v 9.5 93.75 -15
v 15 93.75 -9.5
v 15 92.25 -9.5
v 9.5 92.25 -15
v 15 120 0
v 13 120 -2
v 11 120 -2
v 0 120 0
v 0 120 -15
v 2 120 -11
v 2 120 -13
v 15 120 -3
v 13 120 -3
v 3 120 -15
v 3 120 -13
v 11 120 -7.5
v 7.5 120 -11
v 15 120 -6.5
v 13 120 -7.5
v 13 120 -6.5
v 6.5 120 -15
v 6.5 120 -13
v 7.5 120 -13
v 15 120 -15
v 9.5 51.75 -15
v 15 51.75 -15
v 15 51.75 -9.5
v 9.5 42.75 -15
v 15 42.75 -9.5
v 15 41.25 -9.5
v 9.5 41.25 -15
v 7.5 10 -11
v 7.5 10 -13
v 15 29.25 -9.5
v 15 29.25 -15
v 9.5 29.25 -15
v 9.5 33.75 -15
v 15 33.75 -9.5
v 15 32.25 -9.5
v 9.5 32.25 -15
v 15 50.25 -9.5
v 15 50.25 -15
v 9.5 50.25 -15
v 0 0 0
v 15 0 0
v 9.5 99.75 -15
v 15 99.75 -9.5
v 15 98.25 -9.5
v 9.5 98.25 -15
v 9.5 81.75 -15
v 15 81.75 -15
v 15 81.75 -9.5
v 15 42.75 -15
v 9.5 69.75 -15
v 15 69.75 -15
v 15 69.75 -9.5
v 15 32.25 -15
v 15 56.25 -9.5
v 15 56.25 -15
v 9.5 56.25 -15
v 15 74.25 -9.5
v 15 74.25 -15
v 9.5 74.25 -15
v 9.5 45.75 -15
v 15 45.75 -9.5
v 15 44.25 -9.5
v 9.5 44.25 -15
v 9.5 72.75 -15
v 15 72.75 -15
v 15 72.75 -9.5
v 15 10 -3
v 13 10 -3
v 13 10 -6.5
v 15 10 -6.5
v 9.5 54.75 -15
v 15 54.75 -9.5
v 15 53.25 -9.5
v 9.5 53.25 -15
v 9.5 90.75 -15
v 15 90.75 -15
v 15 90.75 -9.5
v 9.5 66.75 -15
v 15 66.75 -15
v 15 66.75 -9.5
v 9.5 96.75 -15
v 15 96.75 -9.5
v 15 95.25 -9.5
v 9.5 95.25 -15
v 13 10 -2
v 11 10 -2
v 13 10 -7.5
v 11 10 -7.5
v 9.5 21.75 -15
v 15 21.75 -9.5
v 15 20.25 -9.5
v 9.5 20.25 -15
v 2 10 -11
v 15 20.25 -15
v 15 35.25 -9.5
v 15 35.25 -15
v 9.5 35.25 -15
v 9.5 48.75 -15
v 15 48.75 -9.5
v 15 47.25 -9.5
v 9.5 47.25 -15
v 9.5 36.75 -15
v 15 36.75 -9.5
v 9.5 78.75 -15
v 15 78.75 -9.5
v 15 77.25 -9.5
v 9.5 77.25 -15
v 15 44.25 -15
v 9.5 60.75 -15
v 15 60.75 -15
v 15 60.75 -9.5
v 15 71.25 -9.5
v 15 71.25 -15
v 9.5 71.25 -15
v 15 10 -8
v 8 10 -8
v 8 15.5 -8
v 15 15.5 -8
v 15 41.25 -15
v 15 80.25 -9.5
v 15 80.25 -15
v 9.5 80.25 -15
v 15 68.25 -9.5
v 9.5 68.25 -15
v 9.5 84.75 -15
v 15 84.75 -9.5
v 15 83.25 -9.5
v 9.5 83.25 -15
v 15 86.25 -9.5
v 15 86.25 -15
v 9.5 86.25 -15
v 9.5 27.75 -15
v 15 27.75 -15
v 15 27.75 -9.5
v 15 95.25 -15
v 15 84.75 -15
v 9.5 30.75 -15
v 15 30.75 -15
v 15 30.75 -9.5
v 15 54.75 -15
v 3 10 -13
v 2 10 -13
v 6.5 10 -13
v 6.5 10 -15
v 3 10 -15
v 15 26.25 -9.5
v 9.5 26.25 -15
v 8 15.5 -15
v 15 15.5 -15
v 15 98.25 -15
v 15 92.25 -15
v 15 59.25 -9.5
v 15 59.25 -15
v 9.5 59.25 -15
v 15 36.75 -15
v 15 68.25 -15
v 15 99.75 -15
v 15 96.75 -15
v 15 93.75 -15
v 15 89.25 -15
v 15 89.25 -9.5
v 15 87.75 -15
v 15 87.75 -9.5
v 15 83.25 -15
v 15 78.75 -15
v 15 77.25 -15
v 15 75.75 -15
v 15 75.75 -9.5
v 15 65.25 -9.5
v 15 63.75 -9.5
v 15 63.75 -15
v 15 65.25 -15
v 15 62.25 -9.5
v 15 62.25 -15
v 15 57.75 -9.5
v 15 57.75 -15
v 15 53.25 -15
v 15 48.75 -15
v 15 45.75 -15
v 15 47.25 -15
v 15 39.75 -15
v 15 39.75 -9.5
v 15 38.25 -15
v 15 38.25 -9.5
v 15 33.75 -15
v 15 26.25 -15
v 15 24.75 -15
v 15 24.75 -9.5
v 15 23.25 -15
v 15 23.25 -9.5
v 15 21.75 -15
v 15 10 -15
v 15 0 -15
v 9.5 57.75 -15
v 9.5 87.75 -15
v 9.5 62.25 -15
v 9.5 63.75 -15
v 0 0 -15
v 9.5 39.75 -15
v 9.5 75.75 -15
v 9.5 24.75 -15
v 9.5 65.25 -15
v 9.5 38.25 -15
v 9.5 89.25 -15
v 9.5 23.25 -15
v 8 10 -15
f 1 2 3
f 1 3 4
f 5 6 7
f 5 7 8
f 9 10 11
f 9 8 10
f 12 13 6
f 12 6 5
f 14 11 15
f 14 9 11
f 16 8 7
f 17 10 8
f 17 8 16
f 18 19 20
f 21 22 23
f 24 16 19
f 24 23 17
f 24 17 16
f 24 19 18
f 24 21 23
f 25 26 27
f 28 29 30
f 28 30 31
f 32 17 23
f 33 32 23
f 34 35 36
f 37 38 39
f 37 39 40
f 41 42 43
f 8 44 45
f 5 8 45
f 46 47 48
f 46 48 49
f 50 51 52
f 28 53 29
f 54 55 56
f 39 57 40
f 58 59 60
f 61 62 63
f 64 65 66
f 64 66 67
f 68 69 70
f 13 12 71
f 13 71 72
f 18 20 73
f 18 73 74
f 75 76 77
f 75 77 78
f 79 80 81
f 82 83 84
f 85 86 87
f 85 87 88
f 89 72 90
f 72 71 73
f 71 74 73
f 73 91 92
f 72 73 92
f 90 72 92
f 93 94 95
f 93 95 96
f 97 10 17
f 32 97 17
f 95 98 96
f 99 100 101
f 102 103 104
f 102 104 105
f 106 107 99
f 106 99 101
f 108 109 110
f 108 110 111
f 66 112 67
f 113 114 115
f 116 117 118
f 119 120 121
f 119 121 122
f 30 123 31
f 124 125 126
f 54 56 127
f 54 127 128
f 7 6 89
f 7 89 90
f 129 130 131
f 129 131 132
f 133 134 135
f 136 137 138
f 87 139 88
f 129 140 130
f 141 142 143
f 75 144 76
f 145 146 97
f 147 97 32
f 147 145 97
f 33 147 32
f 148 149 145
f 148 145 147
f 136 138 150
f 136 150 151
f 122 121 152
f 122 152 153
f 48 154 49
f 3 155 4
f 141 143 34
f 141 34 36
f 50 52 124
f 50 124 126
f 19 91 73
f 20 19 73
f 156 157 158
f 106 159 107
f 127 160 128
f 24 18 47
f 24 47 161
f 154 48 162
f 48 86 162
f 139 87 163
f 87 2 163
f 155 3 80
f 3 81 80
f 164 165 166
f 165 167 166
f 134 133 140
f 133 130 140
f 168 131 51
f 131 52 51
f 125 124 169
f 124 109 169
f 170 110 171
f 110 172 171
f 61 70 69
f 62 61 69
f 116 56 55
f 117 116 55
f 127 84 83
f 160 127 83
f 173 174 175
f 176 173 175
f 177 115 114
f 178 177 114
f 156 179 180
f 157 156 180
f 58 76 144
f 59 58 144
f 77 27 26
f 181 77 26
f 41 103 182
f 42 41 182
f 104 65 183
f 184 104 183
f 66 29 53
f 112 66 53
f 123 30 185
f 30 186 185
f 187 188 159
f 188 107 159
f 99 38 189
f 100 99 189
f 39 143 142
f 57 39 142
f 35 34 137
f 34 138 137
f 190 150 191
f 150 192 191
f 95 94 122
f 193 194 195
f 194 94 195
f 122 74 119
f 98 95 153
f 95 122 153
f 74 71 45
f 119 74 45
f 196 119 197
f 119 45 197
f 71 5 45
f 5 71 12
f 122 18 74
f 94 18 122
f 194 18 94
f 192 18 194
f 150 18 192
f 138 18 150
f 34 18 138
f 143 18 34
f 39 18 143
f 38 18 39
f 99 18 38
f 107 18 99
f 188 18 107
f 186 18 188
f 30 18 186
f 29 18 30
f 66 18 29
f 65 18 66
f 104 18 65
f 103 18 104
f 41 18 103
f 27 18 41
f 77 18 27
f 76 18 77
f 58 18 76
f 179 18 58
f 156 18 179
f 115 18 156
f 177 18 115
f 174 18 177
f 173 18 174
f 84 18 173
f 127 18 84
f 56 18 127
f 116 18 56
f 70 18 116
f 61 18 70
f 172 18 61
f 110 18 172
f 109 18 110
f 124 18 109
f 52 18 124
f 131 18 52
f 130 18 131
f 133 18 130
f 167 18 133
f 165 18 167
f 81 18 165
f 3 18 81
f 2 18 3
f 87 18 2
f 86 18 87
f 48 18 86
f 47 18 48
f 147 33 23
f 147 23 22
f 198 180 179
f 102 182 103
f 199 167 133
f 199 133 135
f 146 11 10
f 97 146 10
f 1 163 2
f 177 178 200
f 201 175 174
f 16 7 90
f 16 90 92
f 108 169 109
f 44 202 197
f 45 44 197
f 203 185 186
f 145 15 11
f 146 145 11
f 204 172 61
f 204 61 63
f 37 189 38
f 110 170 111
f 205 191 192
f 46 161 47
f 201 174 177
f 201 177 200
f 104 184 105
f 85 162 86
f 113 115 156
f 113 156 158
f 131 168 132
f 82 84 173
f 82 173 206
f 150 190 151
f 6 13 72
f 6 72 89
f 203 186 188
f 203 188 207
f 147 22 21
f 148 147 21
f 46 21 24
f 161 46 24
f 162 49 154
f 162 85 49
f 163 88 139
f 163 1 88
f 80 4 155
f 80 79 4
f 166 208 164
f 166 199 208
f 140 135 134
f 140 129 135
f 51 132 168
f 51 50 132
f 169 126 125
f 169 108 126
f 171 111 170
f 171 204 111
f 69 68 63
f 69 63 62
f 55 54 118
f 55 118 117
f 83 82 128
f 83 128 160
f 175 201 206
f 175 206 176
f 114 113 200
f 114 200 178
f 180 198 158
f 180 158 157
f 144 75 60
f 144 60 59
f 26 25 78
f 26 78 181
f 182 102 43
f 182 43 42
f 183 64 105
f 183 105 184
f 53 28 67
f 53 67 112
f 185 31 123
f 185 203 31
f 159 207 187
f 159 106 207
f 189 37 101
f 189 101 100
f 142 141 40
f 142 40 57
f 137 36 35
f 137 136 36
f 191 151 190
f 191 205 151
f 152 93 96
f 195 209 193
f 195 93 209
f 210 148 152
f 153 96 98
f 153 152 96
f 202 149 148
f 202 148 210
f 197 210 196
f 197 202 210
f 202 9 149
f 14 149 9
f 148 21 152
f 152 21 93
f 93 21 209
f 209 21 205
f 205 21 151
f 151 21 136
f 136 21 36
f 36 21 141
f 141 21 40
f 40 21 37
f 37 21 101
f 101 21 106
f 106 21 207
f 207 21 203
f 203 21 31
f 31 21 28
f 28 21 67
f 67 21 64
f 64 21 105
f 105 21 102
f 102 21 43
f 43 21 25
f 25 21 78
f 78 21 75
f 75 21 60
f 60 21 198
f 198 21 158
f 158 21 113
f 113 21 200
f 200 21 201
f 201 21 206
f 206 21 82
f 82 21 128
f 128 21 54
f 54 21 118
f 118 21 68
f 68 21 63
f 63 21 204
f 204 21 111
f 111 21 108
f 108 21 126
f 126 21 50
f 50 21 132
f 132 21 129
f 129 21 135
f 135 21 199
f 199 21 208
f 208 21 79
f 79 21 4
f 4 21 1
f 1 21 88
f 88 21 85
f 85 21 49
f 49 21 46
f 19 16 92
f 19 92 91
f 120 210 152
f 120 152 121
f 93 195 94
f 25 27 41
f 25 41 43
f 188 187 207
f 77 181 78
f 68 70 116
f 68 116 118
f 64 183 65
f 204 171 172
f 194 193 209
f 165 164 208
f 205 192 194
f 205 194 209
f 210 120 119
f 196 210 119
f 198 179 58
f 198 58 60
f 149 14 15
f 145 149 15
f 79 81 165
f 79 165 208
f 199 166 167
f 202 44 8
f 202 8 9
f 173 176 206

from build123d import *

# Parameters (mm, degrees)
SKETCH1_W           = 15
SKETCH1_H           = 15
BOSS_EXTRUDE1_DEPTH = 120
CUT_EXTRUDE1_DEPTH  = 110
CUT_EXTRUDE2_START  = -20.25
CUT_EXTRUDE2_DEPTH  = 1.5
LPATTERN1_COUNT     = 27
LPATTERN1_PITCH     = 3
CUT_EXTRUDE3_START  = -10
SKETCH6_W           = 7
SKETCH6_H           = 7
CUT_EXTRUDE3_DEPTH  = 5.5


with BuildPart() as part:
    # Sketch1 → Boss-Extrude1 (new body)
    with BuildSketch(Plane(origin=(0, 0, 0), x_dir=(1, 0, 0), z_dir=(0, 1, 0))):
        with Locations((7.5, 7.5)):
            Rectangle(SKETCH1_W, SKETCH1_H)
    extrude(amount=BOSS_EXTRUDE1_DEPTH)

    # Sketch3 → Cut-Extrude1 (cut)
    with BuildSketch(Plane(origin=(0, 120, 0), x_dir=(1, 0, 0), z_dir=(0, 1, 0))):
        Polygon((15, 3), (13, 3), (13, 2), (11, 2), (11, 7.5), (13, 7.5), (13, 6.5), (15, 6.5), align=None)
        Polygon((3, 13), (2, 13), (2, 11), (7.5, 11), (7.5, 13), (6.5, 13), (6.5, 15), (3, 15), align=None)
    extrude(amount=-CUT_EXTRUDE1_DEPTH, mode=Mode.SUBTRACT)

    # Sketch5 → Cut-Extrude2 (cut)
    with BuildSketch(Plane(origin=(0, 120, 0), x_dir=(1, 0, 0), z_dir=(0, 1, 0)).offset(CUT_EXTRUDE2_START)):
        Polygon((15, 15), (15, 9.5), (9.5, 15), align=None)
    cut_extrude2 = extrude(amount=-CUT_EXTRUDE2_DEPTH, mode=Mode.SUBTRACT)

    # LPattern1: Cut-Extrude2 ×27
    with Locations(*[(0, -i * LPATTERN1_PITCH, 0) for i in range(1, LPATTERN1_COUNT)]):
        add(cut_extrude2, mode=Mode.SUBTRACT)

    # Sketch6 → Cut-Extrude3 (cut)
    with BuildSketch(Plane.XZ.offset(CUT_EXTRUDE3_START)):
        with Locations((11.5, -11.5)):
            Rectangle(SKETCH6_W, SKETCH6_H)
    extrude(amount=-CUT_EXTRUDE3_DEPTH, mode=Mode.SUBTRACT)


solid = part.part
